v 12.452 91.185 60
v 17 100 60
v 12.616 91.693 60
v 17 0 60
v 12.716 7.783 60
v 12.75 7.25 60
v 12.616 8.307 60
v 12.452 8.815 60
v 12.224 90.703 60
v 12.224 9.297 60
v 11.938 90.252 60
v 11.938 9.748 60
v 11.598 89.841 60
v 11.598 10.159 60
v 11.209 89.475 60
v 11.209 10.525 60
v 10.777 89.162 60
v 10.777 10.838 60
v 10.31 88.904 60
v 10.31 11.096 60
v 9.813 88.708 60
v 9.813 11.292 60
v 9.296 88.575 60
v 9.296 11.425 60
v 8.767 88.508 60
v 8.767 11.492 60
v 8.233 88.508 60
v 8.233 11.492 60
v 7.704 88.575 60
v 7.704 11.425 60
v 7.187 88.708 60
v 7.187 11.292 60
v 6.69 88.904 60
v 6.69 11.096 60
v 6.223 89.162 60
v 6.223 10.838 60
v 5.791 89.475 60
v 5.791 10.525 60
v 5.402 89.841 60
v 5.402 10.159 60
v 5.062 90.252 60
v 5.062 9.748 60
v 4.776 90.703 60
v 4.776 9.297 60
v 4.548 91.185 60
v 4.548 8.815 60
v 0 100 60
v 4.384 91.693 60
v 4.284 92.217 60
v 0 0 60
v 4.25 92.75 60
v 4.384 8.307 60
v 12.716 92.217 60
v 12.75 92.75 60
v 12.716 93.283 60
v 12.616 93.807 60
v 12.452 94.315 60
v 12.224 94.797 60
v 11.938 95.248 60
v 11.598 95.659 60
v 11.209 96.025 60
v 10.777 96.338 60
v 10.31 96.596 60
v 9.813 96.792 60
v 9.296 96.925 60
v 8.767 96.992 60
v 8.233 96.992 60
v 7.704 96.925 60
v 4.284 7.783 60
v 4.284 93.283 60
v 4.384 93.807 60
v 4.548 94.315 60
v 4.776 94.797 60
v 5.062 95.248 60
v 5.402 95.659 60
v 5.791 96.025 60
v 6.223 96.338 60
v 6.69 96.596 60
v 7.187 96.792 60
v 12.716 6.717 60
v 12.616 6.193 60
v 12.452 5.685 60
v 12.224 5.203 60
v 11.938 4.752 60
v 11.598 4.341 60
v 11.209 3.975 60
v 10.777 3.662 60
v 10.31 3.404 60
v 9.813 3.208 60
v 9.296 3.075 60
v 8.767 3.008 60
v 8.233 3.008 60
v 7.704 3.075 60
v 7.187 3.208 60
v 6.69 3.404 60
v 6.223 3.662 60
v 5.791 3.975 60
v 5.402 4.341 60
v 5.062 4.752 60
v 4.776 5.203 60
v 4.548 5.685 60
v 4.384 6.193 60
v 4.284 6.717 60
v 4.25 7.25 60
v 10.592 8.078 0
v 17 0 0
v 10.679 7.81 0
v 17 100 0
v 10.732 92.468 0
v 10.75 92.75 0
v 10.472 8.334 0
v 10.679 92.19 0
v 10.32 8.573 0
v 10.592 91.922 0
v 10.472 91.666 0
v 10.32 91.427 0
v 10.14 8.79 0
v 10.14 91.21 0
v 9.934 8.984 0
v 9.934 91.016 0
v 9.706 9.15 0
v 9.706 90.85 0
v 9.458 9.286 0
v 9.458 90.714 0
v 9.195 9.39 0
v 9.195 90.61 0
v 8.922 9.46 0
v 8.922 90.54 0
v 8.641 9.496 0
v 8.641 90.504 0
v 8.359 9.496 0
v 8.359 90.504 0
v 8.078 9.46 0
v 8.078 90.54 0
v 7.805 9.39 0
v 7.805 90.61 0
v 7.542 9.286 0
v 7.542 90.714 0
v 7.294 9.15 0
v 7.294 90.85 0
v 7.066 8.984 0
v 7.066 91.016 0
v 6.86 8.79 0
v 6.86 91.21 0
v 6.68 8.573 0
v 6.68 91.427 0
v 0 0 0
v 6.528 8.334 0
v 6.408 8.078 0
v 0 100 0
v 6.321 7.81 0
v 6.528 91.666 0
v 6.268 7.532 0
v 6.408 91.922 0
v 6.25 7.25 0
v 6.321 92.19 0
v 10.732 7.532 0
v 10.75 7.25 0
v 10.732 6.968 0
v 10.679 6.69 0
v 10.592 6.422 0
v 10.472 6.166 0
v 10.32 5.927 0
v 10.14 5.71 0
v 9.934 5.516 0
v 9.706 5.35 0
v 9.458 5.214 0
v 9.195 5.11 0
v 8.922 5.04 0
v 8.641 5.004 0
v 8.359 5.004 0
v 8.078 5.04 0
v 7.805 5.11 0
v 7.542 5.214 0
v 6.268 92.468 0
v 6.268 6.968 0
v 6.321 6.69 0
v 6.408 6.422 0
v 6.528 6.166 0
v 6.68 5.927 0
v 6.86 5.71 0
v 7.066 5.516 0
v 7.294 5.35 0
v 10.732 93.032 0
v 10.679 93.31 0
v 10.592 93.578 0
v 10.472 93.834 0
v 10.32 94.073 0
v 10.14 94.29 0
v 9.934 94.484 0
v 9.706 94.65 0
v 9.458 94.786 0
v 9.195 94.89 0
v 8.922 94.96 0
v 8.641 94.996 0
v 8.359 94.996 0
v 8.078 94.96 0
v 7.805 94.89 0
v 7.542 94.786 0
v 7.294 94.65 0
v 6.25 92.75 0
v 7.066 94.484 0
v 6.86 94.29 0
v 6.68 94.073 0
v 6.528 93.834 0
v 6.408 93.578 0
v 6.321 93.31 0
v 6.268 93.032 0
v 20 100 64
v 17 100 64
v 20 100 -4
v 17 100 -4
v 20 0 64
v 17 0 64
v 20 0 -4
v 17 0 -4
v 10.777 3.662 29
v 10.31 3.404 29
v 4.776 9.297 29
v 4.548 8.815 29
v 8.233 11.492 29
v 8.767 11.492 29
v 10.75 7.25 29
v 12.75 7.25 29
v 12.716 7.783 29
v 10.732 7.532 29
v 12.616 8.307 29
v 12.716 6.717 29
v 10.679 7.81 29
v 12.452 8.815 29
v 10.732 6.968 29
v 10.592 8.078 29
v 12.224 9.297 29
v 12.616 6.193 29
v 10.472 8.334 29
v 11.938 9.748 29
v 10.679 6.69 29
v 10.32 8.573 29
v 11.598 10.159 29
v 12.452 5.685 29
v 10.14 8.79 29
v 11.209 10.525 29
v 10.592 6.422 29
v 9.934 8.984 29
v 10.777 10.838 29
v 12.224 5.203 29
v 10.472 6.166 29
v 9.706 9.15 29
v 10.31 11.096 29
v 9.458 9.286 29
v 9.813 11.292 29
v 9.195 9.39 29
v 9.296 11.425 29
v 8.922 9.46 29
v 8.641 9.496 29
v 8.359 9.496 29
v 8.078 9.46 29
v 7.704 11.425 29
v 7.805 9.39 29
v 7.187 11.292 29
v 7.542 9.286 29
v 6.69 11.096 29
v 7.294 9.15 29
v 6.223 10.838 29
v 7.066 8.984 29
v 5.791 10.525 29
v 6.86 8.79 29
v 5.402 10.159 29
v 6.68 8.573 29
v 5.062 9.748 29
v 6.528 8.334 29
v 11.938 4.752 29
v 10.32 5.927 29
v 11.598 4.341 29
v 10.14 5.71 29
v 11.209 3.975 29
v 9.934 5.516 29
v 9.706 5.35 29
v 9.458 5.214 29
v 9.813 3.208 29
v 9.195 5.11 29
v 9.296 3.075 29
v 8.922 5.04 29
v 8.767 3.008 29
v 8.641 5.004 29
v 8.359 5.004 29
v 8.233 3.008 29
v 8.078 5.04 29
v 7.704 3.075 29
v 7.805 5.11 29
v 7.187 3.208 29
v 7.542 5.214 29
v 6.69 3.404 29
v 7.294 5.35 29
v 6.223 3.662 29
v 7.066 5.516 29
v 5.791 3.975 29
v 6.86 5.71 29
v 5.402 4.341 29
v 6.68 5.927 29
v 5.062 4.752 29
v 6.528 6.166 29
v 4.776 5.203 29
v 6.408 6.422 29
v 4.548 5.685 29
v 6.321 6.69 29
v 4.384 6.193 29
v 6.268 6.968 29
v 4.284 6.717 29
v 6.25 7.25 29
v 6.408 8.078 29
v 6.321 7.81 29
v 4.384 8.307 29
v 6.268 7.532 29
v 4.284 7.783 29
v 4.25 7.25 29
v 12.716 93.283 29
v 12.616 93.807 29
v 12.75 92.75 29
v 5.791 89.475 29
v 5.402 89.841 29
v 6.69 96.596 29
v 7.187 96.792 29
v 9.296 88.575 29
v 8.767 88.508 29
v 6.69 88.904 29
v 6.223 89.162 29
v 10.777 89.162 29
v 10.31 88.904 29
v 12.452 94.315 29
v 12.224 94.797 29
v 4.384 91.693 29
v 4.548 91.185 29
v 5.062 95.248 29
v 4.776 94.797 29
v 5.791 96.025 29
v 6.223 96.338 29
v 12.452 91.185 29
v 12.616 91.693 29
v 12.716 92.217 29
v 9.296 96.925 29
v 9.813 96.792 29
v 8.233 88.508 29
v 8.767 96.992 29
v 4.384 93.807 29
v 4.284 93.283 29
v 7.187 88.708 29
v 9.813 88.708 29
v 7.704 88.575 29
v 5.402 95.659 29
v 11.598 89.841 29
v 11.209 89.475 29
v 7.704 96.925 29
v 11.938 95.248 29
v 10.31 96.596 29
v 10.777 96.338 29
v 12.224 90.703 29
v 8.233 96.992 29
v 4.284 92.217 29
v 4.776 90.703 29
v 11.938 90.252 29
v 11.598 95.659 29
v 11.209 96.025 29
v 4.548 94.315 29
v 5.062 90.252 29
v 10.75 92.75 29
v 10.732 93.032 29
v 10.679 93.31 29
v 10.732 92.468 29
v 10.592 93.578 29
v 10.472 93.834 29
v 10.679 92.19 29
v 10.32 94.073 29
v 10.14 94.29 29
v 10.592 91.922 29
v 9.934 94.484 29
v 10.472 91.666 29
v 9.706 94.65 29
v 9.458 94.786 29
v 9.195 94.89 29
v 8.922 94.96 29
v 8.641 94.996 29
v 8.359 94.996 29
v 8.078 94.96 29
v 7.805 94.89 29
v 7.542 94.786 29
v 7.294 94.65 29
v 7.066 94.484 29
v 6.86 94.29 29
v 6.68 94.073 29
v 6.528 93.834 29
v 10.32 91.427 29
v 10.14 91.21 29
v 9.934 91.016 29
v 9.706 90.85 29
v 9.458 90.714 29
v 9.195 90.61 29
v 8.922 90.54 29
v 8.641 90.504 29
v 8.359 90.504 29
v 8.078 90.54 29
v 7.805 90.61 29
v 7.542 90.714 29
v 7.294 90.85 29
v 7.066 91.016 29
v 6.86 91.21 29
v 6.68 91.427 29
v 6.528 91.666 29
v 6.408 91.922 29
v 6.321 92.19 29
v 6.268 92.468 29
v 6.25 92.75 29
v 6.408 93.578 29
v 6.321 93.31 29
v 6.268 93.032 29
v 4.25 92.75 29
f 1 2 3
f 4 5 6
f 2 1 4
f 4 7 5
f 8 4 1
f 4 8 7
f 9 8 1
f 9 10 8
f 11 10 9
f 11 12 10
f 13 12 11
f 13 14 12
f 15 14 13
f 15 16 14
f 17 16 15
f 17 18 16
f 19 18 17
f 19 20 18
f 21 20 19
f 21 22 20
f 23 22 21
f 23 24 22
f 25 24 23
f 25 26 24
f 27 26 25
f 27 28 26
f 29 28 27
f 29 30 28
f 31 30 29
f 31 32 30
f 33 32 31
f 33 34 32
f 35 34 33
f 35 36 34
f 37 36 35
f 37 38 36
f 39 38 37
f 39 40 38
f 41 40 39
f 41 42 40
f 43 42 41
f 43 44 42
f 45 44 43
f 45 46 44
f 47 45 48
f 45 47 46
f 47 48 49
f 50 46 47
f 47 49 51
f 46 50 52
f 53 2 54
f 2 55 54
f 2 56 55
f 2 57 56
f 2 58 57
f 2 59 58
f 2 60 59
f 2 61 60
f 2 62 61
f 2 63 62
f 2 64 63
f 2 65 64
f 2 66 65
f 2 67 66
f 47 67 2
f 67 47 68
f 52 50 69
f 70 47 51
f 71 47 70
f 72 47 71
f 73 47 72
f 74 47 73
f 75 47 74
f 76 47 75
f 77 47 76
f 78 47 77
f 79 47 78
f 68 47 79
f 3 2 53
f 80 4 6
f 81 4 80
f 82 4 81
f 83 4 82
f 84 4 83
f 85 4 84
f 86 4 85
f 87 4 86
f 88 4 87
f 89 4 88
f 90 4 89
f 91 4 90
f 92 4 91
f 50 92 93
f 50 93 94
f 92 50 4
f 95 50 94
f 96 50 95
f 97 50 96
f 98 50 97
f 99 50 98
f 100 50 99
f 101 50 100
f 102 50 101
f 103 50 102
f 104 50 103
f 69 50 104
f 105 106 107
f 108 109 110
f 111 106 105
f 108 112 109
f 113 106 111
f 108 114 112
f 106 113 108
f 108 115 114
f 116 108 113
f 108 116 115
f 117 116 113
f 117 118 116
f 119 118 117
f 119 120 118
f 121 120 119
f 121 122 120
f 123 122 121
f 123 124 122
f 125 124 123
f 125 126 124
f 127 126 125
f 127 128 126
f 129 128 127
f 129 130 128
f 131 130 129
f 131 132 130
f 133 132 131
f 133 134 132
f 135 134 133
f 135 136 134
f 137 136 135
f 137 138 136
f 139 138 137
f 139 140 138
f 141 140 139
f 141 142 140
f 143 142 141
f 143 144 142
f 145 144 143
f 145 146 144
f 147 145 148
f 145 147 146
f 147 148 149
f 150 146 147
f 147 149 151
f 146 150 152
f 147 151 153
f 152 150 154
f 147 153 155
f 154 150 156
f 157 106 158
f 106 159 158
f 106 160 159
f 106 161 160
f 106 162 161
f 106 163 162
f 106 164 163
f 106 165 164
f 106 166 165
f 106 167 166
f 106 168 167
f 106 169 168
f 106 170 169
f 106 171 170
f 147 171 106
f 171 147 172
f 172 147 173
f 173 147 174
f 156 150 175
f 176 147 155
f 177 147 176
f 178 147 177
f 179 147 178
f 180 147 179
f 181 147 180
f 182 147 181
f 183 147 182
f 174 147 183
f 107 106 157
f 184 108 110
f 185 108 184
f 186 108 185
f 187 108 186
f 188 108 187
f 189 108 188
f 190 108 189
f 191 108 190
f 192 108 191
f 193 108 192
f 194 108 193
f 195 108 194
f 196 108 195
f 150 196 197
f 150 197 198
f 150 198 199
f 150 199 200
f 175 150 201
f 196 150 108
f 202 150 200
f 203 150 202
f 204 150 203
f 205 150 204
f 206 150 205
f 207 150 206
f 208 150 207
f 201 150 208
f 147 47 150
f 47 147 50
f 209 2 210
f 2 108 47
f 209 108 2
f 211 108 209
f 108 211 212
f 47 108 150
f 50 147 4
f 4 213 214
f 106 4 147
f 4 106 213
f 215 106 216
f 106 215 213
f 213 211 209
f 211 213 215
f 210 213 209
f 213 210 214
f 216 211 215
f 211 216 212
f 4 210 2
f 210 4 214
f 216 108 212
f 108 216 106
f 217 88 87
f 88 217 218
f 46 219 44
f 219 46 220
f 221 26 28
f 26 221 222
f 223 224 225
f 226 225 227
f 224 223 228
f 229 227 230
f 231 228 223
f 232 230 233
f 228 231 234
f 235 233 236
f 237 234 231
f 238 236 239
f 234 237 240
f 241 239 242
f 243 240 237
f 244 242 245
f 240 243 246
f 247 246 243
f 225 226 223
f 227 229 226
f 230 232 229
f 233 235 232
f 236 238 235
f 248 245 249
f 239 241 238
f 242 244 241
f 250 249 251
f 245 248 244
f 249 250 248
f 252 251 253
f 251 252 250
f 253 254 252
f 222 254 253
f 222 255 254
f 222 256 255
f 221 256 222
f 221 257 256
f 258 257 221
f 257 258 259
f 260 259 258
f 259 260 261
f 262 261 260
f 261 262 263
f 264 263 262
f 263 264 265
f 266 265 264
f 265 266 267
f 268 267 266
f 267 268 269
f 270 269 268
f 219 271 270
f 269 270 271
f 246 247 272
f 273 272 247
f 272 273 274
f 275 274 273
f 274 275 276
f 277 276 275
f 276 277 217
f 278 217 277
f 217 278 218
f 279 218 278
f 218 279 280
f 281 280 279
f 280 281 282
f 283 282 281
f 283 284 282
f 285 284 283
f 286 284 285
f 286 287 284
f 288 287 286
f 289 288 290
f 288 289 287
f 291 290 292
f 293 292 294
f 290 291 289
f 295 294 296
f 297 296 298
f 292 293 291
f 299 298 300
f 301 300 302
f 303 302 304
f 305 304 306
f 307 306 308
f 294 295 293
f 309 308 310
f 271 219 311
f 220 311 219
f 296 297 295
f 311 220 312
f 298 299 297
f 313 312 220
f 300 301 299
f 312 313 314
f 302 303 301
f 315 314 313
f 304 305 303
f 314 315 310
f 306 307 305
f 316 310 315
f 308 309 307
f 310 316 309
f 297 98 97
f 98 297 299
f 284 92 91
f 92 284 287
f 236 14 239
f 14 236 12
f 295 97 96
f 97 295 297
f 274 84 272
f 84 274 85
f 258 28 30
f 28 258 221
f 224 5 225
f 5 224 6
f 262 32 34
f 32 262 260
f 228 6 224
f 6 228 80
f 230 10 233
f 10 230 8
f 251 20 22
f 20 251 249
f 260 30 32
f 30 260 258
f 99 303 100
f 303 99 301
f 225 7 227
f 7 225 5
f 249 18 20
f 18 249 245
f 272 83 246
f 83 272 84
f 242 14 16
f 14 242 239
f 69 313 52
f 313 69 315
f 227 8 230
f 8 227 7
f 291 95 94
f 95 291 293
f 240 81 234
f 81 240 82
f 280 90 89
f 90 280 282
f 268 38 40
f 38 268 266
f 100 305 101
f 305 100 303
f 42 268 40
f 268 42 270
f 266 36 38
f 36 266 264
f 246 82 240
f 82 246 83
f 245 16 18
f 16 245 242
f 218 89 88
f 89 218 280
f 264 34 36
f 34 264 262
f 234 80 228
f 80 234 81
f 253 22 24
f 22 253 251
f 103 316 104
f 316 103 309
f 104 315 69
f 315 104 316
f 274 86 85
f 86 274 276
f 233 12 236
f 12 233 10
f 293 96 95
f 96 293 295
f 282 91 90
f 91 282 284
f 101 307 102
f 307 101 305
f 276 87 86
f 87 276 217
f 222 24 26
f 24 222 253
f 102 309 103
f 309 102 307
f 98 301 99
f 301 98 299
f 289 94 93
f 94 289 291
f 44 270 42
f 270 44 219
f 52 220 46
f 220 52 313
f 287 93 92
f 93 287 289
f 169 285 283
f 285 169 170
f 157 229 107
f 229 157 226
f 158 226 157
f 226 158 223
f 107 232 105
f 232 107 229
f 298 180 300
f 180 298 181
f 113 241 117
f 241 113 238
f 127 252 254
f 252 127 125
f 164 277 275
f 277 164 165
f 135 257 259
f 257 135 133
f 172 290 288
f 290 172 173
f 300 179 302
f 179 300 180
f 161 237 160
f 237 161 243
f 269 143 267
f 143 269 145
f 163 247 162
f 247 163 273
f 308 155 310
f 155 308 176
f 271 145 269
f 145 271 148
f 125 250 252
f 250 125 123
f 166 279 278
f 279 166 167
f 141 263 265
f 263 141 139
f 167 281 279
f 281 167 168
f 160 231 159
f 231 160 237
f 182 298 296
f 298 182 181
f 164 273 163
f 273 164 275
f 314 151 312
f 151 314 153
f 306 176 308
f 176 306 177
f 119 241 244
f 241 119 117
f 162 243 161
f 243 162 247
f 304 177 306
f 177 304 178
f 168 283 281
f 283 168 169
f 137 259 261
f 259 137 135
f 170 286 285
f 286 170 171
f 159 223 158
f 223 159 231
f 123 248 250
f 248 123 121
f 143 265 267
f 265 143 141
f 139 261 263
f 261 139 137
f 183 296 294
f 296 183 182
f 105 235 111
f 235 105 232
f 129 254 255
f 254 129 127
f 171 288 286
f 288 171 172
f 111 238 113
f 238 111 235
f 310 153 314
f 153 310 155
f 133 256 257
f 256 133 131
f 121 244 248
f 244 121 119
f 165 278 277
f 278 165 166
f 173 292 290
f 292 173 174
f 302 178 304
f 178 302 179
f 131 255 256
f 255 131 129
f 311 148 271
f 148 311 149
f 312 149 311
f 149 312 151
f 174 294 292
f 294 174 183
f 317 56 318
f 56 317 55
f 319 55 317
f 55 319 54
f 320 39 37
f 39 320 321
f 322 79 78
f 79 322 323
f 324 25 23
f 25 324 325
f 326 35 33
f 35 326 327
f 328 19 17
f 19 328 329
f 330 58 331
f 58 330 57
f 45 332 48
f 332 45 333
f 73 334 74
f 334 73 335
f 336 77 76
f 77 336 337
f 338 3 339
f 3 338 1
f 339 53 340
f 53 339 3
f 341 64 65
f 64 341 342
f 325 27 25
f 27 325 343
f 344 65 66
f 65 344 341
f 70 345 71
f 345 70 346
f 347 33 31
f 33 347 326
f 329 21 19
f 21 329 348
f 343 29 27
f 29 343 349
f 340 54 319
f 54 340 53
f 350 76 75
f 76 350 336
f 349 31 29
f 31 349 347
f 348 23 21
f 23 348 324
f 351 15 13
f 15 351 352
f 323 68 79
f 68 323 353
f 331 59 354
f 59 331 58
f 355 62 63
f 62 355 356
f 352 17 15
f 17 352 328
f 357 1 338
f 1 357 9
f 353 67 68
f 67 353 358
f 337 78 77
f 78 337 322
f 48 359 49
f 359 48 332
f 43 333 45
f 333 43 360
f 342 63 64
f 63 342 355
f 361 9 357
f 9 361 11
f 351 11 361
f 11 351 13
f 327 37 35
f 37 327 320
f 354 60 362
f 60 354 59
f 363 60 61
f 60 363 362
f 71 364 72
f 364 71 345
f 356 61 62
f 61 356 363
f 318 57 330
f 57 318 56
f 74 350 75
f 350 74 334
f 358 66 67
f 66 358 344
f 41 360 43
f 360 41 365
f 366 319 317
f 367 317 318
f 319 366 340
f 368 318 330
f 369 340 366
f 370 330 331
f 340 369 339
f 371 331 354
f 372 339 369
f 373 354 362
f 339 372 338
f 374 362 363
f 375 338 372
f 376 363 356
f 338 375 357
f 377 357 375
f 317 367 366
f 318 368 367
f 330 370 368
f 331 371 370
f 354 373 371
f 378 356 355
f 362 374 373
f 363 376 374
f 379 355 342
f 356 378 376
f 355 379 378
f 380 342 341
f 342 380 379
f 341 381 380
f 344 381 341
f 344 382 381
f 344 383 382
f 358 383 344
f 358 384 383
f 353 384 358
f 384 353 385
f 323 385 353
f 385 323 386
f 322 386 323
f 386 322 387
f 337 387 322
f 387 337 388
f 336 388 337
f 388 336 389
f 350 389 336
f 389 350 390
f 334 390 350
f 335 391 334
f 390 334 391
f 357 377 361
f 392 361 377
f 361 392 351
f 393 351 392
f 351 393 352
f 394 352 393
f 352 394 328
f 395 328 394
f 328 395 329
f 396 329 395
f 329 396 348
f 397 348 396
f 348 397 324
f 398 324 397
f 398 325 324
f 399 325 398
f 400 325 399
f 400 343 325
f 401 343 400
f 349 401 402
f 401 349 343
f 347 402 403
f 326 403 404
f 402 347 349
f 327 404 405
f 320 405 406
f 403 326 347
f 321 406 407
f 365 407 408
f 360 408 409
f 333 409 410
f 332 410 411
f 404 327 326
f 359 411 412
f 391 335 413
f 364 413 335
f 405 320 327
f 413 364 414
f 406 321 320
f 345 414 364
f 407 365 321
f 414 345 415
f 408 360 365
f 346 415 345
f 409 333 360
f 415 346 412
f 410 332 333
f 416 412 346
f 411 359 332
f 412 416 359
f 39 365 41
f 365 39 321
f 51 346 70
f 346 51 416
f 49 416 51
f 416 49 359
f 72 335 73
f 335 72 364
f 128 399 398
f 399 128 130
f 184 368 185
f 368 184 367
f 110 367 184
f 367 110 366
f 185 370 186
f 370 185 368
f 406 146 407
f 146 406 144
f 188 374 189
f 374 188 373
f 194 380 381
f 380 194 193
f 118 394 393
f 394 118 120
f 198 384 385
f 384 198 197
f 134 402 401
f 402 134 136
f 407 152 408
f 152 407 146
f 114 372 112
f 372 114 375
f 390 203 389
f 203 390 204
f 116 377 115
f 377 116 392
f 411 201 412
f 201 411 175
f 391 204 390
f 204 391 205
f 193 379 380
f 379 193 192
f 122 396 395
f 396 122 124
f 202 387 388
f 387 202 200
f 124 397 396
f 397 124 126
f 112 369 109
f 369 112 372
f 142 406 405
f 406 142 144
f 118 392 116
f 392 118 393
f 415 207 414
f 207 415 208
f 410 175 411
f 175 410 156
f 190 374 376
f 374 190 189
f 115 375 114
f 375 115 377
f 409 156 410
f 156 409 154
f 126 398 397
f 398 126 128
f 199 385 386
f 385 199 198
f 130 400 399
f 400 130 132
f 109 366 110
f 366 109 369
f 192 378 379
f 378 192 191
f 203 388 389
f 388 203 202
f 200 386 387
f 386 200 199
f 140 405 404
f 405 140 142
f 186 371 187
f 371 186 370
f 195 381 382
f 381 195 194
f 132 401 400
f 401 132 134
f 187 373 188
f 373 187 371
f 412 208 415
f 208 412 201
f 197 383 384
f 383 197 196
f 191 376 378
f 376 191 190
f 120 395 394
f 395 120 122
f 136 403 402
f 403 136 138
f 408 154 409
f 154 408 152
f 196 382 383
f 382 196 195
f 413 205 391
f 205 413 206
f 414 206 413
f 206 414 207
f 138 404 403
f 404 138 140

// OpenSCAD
thickness = 17;
height = 60;
length = 100;

hole_dist = 3; // From border

head_d = 8;
screw_d = 4;
screw_h = 29;
tol = 0.5;

lip_height = 4;
lip_thickness = 3;

difference(){
    
    union(){
        cube( [ thickness + lip_thickness / 2, length, height ] );
        translate( [ thickness, 0, -lip_height ] )
            cube( [ lip_thickness, length, height + 2 * lip_height ] );
    }
    
    translate( [ thickness / 2, ( head_d + tol ) / 2 + hole_dist, screw_h ] )
        cylinder( d = head_d + tol, h = height, $fn = 50 );
    translate( [ thickness / 2, ( head_d + tol ) / 2 + hole_dist, -1 ] )
        cylinder( d = screw_d + tol, h = height + 2, $fn = 50 );
    
    translate( [ thickness / 2, length - ( head_d + tol ) / 2 - hole_dist, screw_h ] )
        cylinder( d = head_d + tol, h = height, $fn = 50 );
    translate( [ thickness / 2, length - ( head_d + tol ) / 2 - hole_dist, -1 ] )
        cylinder( d = screw_d + tol, h = height + 2, $fn = 50 );
}
